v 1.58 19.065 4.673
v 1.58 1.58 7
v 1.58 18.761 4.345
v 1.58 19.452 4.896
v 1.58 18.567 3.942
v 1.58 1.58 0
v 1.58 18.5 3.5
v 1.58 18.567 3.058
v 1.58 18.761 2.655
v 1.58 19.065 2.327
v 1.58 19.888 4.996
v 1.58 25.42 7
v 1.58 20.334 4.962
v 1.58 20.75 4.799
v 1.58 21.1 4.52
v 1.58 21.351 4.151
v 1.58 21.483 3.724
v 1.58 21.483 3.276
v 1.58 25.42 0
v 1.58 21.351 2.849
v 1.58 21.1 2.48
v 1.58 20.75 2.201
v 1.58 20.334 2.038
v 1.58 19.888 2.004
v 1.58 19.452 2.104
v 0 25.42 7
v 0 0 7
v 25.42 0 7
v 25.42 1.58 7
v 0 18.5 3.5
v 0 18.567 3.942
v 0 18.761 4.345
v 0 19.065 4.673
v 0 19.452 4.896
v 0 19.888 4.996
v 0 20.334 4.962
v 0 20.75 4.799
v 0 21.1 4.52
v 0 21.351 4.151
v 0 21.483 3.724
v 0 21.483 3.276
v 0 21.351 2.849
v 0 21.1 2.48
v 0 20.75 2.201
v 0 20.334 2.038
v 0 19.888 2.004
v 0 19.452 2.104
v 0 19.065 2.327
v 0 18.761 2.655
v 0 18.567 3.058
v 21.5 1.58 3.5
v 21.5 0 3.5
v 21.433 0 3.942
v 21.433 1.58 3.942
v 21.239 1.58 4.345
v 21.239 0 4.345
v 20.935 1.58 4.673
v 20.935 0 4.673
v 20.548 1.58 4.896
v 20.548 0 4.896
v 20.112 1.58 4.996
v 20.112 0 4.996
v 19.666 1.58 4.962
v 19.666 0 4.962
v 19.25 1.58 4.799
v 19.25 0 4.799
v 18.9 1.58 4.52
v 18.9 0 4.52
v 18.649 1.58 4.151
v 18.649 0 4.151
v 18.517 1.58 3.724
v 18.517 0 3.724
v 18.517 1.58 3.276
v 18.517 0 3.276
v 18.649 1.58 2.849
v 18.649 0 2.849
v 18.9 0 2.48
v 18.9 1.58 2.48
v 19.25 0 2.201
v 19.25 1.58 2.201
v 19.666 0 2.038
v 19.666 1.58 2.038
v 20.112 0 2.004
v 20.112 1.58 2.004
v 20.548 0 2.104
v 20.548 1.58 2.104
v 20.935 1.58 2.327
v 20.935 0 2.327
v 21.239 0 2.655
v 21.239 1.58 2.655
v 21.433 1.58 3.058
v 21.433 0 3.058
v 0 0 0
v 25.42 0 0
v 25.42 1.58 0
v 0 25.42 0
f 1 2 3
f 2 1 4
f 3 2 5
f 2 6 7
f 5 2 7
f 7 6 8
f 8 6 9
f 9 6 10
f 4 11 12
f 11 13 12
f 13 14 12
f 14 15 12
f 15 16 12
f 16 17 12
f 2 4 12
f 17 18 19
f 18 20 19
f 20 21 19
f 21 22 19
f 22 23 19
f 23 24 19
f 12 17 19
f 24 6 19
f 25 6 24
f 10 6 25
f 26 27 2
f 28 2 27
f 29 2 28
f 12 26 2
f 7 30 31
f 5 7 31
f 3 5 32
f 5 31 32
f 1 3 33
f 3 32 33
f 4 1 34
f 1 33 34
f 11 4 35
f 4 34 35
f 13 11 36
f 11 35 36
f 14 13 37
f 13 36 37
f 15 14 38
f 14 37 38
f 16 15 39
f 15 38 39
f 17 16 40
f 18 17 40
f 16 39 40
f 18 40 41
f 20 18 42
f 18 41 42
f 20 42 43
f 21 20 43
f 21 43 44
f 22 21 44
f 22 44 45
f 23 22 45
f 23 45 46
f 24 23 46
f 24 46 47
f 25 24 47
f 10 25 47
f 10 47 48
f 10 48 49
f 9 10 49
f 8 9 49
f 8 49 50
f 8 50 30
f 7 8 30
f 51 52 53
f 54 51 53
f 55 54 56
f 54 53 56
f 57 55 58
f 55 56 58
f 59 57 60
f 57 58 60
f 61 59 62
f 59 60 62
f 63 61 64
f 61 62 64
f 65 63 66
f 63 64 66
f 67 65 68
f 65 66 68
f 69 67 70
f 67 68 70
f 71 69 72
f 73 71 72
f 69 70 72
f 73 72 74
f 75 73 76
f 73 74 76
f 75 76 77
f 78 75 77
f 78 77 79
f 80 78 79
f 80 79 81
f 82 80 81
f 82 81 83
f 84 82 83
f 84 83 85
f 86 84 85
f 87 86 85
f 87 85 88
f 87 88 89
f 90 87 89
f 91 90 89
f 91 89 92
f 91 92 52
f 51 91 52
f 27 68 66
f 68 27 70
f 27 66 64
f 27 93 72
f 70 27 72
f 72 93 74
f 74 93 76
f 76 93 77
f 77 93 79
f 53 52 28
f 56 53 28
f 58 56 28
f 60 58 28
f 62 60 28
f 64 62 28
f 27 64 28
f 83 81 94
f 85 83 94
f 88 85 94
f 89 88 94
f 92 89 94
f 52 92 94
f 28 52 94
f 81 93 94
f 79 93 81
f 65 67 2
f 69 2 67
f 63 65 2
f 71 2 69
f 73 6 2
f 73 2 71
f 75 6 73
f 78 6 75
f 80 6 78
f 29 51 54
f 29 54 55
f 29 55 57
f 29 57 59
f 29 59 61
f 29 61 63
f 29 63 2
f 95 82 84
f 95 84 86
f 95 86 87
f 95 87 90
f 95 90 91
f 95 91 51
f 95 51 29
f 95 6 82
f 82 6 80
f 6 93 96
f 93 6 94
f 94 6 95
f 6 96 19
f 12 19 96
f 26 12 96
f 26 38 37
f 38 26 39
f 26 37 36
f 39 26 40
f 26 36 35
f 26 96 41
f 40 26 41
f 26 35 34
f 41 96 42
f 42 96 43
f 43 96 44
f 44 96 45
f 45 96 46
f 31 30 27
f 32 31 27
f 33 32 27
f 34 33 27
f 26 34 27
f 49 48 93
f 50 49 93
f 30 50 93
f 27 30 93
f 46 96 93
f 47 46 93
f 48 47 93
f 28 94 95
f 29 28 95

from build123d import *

# Parameters (mm, degrees)
F0_W     = 23.84
F0_H     = 1.58
F1_DEPTH = 7
F2_R     = 1.5
F3_DEPTH = 25
F4_R     = 1.5
F5_DEPTH = 25


with BuildPart() as f1:
    # F0 (on Top) → F1 (new body)
    with BuildSketch(Plane.XY):
        Polygon((0, 25.42), (0, 0), (1.58, 0), (1.58, 1.58), (1.58, 25.42), align=None)
        with Locations((13.5, 0.79)):
            Rectangle(F0_W, F0_H)
    extrude(amount=F1_DEPTH)

    # F2 (on face) → F3 (cut)
    with BuildSketch(Plane(origin=(0, 0, 0), x_dir=(0, -1, 0), z_dir=(-1, 0, 0))):
        with Locations((-20, 3.5)):
            Circle(F2_R)
    extrude(amount=-F3_DEPTH, mode=Mode.SUBTRACT)

    # F4 (on face) → F5 (cut)
    with BuildSketch(Plane.XZ):
        with Locations((20, 3.5)):
            Circle(F4_R)
    extrude(amount=-F5_DEPTH, mode=Mode.SUBTRACT)


solid = f1.part
